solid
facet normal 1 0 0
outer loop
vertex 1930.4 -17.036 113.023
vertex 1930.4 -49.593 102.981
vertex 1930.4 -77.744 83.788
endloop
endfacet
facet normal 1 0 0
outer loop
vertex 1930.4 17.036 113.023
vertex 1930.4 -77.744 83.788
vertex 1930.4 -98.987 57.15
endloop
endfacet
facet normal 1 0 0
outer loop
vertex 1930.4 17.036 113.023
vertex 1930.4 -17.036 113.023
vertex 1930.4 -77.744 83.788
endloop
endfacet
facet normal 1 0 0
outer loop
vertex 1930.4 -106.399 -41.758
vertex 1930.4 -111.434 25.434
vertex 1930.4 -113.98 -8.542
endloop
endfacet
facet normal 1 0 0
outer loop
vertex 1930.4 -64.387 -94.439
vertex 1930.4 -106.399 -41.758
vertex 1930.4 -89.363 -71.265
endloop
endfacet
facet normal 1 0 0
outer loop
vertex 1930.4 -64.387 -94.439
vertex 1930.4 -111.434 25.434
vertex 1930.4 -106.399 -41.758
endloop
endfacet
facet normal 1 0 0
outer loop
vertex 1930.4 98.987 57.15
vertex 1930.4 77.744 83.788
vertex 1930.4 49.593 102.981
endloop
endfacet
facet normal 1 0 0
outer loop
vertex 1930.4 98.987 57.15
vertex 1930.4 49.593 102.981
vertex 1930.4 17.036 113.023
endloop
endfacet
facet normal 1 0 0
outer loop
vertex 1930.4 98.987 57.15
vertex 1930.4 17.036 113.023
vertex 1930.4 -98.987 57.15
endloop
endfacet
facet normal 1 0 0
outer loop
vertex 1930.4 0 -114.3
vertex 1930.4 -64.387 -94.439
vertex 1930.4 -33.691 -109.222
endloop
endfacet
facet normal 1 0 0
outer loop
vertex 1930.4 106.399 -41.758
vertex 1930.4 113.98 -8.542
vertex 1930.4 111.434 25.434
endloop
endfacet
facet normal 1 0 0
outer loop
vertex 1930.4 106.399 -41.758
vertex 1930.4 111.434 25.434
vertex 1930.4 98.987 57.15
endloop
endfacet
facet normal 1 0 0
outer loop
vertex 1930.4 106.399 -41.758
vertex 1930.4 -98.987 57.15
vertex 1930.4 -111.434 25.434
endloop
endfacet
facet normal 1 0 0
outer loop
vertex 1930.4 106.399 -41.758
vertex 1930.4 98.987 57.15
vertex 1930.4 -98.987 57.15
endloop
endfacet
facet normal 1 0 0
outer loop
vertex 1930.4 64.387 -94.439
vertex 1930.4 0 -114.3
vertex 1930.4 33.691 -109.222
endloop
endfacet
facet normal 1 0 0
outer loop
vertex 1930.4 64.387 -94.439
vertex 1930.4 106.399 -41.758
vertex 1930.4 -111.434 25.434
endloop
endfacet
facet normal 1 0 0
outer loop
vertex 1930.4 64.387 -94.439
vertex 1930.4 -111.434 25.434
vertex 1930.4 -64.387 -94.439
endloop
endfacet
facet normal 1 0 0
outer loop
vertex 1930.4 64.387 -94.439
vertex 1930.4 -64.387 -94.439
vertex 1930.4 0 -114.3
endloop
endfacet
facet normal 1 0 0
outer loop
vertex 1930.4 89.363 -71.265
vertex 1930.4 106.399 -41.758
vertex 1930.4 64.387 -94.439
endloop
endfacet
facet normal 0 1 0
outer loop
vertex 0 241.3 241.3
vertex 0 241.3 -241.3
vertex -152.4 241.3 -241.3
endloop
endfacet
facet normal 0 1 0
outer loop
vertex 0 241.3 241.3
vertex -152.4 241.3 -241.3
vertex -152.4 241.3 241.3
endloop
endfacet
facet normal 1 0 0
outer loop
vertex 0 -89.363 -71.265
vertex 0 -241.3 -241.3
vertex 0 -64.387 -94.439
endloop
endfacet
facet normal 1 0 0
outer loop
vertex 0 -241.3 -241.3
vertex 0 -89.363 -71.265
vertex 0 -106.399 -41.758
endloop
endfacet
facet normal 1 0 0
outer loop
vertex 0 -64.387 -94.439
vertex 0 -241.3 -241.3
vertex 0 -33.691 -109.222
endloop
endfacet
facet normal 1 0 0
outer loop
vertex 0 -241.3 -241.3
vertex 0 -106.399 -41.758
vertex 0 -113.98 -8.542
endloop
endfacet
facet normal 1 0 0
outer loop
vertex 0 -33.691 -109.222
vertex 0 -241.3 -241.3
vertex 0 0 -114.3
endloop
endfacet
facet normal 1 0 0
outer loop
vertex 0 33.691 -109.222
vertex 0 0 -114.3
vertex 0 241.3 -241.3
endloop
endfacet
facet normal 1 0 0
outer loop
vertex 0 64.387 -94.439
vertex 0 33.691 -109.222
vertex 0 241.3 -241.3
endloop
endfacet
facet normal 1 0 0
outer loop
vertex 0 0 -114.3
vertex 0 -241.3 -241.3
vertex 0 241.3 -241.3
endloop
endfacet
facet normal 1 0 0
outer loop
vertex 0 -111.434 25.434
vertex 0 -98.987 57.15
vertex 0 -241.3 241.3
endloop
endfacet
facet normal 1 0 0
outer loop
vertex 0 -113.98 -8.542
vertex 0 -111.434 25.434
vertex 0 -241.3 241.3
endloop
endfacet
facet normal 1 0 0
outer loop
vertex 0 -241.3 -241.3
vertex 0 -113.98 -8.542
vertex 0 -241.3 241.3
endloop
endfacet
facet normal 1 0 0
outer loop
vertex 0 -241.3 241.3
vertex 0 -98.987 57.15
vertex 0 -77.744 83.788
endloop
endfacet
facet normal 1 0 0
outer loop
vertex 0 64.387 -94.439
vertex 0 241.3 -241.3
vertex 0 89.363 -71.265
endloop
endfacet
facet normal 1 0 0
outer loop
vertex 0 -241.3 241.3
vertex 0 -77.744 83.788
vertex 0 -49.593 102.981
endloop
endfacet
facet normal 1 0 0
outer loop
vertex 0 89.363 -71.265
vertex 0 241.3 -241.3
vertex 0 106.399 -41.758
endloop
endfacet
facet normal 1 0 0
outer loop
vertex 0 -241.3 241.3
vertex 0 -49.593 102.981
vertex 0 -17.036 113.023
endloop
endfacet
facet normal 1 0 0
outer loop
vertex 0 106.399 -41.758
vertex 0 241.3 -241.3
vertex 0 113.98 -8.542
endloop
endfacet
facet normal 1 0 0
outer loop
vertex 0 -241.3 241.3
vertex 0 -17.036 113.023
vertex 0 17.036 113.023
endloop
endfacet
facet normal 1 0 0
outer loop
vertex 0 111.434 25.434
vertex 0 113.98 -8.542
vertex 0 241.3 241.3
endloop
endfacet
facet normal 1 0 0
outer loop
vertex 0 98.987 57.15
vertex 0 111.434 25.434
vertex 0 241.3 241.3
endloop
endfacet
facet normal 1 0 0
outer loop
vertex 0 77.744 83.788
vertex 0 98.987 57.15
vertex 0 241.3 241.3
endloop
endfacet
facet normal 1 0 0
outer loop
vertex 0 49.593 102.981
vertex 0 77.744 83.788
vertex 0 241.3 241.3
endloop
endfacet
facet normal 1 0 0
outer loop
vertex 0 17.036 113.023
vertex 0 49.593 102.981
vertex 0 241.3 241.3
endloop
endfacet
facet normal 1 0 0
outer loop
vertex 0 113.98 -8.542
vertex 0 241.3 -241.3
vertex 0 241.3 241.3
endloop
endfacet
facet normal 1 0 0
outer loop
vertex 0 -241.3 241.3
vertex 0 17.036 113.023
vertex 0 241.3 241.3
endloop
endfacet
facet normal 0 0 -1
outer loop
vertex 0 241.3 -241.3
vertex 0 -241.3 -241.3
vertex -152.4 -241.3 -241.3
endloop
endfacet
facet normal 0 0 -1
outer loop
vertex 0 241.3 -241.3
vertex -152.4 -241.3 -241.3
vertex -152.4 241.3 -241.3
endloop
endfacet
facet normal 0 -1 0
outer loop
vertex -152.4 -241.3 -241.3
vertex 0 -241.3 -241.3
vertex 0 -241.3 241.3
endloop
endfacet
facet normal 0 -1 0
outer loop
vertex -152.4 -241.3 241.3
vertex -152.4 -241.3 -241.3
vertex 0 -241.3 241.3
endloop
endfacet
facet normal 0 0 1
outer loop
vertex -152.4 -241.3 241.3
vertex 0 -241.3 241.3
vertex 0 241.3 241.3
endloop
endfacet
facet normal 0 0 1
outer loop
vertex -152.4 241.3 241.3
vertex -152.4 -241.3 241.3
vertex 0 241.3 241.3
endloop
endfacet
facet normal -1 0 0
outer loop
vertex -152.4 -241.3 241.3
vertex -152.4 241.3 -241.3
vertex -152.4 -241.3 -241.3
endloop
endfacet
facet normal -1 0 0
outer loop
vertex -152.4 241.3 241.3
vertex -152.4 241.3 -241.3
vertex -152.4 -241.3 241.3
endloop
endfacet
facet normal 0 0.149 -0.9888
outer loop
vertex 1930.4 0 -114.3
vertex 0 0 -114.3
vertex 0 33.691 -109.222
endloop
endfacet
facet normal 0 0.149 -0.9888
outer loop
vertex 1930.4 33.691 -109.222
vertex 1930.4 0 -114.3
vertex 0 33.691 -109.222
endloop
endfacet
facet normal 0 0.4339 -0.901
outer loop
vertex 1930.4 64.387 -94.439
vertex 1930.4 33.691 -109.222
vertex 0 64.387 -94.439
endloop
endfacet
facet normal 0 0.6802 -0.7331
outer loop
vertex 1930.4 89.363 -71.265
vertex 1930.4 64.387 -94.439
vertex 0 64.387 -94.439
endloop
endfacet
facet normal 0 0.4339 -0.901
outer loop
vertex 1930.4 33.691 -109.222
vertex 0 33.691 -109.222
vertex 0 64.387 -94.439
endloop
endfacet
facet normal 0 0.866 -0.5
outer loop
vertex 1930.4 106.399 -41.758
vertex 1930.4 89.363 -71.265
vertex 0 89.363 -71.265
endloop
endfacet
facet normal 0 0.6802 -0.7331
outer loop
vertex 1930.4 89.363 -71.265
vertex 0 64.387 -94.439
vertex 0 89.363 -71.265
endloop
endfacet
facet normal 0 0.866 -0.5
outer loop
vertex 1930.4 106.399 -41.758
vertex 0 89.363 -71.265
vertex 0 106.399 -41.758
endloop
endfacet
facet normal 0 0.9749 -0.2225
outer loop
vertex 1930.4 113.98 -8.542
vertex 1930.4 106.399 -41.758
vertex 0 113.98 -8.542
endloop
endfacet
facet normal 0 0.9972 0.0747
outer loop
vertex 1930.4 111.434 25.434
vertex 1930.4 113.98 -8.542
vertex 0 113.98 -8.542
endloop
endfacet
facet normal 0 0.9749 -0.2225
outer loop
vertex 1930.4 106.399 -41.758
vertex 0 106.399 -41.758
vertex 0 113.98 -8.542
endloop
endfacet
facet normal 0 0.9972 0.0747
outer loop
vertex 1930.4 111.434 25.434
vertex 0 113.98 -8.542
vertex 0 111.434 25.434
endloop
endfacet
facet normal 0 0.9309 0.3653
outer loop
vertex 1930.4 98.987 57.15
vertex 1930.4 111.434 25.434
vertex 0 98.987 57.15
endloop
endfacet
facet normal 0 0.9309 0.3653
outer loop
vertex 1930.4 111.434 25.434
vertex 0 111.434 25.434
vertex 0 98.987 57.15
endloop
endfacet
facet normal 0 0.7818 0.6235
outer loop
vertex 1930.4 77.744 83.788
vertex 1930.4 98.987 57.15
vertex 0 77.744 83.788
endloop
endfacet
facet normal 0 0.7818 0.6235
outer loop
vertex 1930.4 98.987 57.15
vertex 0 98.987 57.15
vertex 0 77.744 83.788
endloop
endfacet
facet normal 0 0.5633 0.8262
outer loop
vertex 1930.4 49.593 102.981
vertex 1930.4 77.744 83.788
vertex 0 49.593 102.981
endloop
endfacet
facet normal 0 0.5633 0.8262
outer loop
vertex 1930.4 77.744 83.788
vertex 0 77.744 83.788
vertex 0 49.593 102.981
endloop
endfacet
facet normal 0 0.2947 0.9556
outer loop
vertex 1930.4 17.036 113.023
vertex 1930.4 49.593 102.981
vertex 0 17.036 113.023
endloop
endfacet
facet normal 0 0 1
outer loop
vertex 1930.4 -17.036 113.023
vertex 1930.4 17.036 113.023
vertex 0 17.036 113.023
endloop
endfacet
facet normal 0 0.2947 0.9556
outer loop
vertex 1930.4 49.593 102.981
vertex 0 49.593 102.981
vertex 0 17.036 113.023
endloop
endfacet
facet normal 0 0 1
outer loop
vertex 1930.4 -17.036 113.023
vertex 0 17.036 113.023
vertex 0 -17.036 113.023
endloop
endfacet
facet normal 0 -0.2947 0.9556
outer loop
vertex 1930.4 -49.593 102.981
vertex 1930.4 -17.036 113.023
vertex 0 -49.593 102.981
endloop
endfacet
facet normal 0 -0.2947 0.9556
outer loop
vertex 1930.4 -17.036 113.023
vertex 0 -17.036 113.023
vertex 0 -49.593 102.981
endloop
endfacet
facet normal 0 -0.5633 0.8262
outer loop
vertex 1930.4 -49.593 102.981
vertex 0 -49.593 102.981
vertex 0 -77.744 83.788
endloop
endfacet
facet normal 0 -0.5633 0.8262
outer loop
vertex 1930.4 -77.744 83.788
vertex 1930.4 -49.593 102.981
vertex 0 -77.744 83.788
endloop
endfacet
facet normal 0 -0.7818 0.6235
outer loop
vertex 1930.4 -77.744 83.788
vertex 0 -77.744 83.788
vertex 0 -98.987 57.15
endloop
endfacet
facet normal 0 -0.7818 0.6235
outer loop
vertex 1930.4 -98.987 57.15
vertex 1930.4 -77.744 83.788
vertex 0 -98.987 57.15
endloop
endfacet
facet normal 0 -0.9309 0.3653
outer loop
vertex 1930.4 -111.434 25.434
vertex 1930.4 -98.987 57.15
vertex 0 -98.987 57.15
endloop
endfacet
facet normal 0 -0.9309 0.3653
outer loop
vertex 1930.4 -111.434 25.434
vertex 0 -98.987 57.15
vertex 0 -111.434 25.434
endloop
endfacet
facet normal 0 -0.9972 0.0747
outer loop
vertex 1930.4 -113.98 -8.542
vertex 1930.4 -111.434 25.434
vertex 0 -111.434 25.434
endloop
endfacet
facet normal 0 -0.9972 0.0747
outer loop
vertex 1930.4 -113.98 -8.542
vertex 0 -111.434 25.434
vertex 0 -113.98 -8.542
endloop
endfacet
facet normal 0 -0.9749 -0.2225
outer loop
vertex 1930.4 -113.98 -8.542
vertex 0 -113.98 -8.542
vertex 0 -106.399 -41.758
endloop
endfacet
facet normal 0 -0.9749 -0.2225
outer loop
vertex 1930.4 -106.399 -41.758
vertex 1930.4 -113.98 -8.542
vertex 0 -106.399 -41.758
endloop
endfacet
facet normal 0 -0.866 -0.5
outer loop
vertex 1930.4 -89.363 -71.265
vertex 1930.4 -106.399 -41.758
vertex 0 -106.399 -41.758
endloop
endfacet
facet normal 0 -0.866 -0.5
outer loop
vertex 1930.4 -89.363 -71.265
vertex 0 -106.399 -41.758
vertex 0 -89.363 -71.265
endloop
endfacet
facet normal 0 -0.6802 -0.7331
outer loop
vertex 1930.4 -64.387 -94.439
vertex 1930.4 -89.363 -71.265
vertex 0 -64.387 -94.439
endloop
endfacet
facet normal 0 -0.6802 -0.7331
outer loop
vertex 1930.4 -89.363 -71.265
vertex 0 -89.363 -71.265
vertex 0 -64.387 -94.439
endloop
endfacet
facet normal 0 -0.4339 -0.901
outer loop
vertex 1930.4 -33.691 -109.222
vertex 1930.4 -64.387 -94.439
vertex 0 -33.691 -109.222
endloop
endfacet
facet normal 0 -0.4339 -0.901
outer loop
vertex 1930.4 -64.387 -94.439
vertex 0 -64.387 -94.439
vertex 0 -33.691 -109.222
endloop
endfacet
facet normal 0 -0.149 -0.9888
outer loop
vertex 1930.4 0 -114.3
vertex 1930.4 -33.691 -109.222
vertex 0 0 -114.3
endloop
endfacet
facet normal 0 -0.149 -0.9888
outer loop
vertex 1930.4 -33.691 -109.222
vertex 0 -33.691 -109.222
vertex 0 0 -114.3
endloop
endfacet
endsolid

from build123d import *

# Parameters (mm, degrees)
SKETCH1_R           = 114.3
BOSS_EXTRUDE1_DEPTH = 1930.4
SKETCH2_W           = 482.6
SKETCH2_H           = 482.6
BOSS_EXTRUDE2_DEPTH = 152.4


with BuildPart() as part:
    # Sketch1 → Boss-Extrude1 (new body)
    with BuildSketch(Plane(origin=(0, 0, 0), x_dir=(0, 0, -1), z_dir=(1, 0, 0))):
        Circle(SKETCH1_R)
    extrude(amount=BOSS_EXTRUDE1_DEPTH)

    # Sketch2 → Boss-Extrude2 (add)
    with BuildSketch(Plane.ZY):
        Rectangle(SKETCH2_W, SKETCH2_H)
    extrude(amount=BOSS_EXTRUDE2_DEPTH)


solid = part.part
